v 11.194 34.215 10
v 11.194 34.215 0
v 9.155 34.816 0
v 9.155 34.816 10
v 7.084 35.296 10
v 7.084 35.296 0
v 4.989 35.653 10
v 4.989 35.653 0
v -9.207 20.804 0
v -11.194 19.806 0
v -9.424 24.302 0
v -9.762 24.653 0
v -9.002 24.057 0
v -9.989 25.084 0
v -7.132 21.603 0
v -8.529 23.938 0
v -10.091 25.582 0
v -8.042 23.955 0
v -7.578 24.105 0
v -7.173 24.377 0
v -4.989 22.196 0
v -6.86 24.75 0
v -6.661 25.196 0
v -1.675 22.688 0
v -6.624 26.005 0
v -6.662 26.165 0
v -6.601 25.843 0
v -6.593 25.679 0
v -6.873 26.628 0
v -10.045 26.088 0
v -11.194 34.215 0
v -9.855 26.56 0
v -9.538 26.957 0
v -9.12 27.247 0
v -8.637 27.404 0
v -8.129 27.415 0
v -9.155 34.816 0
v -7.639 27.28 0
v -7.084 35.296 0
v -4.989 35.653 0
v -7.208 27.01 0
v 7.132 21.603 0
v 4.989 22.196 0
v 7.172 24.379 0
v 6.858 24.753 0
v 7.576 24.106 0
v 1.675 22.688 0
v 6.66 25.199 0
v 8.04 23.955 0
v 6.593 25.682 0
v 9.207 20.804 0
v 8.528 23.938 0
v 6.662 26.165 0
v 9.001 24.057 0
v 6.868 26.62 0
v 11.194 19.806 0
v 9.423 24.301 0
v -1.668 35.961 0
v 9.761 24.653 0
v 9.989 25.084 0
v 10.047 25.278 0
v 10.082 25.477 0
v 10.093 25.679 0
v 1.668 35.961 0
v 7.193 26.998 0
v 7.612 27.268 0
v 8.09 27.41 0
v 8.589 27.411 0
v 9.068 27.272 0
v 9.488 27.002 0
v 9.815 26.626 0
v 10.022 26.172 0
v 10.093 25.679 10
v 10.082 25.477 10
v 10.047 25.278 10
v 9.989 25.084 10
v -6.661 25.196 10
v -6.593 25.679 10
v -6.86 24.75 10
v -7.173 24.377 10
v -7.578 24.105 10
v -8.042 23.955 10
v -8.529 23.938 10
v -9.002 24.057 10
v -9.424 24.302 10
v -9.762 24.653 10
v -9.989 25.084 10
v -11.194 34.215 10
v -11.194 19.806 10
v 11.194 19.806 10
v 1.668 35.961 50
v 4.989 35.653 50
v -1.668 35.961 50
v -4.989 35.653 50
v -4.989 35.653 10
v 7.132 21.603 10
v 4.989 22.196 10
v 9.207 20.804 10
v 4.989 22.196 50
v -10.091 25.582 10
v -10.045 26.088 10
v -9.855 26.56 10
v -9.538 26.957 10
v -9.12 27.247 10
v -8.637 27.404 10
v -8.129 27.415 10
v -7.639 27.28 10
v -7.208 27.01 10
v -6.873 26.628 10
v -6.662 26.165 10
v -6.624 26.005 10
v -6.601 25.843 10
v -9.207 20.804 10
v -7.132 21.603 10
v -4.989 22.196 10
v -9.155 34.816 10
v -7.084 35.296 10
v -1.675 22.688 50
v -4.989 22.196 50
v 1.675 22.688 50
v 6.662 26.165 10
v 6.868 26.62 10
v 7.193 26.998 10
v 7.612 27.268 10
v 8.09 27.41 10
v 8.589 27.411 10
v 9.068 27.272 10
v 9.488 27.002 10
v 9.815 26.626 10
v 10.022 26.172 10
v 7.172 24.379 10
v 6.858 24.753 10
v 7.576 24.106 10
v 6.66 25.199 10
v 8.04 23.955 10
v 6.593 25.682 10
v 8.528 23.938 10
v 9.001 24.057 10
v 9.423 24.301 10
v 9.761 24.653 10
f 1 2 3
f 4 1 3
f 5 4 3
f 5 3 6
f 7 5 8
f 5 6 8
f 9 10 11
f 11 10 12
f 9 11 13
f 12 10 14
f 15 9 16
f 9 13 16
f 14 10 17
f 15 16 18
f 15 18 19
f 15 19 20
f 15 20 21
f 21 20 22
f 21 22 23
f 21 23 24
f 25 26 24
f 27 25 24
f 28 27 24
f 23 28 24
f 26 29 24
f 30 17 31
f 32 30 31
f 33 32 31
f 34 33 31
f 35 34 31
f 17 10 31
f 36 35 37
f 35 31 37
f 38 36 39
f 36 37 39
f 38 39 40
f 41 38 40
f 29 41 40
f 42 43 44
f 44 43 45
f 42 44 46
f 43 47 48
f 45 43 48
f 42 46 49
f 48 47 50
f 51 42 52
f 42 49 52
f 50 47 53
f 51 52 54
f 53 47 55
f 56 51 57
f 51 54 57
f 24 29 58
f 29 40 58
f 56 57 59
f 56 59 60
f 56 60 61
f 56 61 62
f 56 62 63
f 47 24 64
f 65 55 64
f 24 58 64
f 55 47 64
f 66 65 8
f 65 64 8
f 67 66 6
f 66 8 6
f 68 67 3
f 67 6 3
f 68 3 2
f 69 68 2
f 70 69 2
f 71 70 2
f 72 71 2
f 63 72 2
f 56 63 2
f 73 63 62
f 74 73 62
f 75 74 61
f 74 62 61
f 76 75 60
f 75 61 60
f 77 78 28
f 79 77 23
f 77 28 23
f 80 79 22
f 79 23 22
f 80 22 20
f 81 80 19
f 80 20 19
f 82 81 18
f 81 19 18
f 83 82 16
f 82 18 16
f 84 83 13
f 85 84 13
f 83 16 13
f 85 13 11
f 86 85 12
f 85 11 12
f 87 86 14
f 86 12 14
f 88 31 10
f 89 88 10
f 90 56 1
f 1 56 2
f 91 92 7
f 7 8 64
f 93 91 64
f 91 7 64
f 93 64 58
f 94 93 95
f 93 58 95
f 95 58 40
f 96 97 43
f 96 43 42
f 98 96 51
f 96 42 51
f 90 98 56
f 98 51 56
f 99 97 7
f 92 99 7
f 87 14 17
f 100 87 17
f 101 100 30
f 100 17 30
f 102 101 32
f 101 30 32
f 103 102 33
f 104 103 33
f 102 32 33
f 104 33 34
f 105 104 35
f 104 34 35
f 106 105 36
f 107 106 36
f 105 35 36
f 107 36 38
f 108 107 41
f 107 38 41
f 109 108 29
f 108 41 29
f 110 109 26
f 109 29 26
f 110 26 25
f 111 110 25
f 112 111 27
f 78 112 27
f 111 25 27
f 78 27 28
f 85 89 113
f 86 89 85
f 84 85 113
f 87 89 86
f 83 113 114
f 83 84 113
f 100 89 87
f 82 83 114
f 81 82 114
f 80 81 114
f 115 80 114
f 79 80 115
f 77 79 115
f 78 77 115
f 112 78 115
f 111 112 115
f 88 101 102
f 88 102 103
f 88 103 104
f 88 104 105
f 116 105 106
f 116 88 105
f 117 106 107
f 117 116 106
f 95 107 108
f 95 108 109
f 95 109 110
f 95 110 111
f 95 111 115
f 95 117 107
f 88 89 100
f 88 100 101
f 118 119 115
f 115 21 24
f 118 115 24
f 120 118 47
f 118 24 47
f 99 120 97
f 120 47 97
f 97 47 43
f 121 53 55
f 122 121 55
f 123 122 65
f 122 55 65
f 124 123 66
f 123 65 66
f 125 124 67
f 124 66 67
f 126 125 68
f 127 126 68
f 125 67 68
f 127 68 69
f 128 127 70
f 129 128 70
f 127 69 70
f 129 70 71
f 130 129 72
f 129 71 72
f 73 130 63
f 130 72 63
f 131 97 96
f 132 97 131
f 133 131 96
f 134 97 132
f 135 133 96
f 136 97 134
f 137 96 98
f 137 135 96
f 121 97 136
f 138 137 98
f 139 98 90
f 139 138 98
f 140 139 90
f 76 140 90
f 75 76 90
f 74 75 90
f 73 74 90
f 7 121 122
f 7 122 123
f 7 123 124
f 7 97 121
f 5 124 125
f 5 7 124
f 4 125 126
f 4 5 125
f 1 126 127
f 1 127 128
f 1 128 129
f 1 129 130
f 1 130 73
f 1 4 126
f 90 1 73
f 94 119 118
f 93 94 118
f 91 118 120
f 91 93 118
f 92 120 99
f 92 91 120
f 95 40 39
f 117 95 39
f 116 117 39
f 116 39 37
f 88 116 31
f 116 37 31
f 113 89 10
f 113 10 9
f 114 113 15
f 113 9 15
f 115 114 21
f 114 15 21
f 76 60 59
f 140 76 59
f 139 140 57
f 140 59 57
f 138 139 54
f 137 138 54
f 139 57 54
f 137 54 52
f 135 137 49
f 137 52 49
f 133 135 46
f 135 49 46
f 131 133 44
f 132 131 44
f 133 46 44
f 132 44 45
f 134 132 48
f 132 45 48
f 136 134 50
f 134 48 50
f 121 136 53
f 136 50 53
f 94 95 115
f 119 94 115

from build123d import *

# Parameters (mm, degrees)
F1_DEPTH = 10
F2_DEPTH = 50


with BuildPart() as f1:
    # F0 (on Top) → F1 (new body)
    with BuildSketch(Plane.XY):
        with BuildLine():
            Line((-11.1938343047, 34.2154654149), (-11.1938343047, 24.5702680807))
            ThreePointArc((-11.1938343047, 24.5702680807), (-10.5947366889, 24.8344831735), (-9.9894082697, 25.0840930157))
            ThreePointArc((-9.9894082697, 25.0840930157), (-8.8842385883, 27.3428748435), (-6.6624588878, 26.1650843983))
            ThreePointArc((-6.6624588878, 26.1650843983), (-5.8286474975, 26.3633622353), (-4.988963041, 26.5350758012))
            Line((-4.988963041, 26.5350758012), (-4.988963041, 35.6526331114))
            ThreePointArc((-4.988963041, 35.6526331114), (-8.1232441321, 35.0715398118), (-11.1938343047, 34.2154654149))
        make_face()
        with BuildLine():
            ThreePointArc((-4.988963041, 26.5350758012), (0, 27), (4.988963041, 26.5350758012))
            Line((4.988963041, 26.5350758012), (4.988963041, 35.6526331114))
            ThreePointArc((4.988963041, 35.6526331114), (0, 36), (-4.988963041, 35.6526331114))
            Line((-4.988963041, 35.6526331114), (-4.988963041, 26.5350758012))
        make_face()
        with BuildLine():
            ThreePointArc((9.9894082697, 25.0840930157), (10.5947366889, 24.8344831735), (11.1938343047, 24.5702680807))
            Line((11.1938343047, 24.5702680807), (11.1938343047, 34.2154654149))
            ThreePointArc((11.1938343047, 34.2154654149), (8.1232441321, 35.0715398118), (4.988963041, 35.6526331114))
            Line((4.988963041, 35.6526331114), (4.988963041, 26.5350758012))
            ThreePointArc((4.988963041, 26.5350758012), (5.8286474975, 26.3633622353), (6.6624588878, 26.1650843983))
            ThreePointArc((6.6624588878, 26.1650843983), (8.5891721662, 27.4111900636), (10.0934588481, 25.67852594))
            ThreePointArc((10.0934588481, 25.67852594), (10.0672499445, 25.3767905326), (9.9894082697, 25.0840930157))
        make_face()
        with BuildLine():
            ThreePointArc((4.988963041, 22.1962327384), (8.1792145377, 21.2288235554), (11.1938343047, 19.8055692561))
            Line((11.1938343047, 19.8055692561), (11.1938343047, 24.5702680807))
            ThreePointArc((11.1938343047, 24.5702680807), (10.5947366889, 24.8344831735), (9.9894082697, 25.0840930157))
            ThreePointArc((9.9894082697, 25.0840930157), (7.802679108, 24.0141770365), (6.6624588878, 26.1650843983))
            ThreePointArc((6.6624588878, 26.1650843983), (5.8286474975, 26.3633622353), (4.988963041, 26.5350758012))
            Line((4.988963041, 26.5350758012), (4.988963041, 22.1962327384))
        make_face()
        with BuildLine():
            Line((-11.1938343047, 24.5702680807), (-11.1938343047, 19.8055692561))
            ThreePointArc((-11.1938343047, 19.8055692561), (-8.1792145377, 21.2288235554), (-4.988963041, 22.1962327384))
            Line((-4.988963041, 22.1962327384), (-4.988963041, 26.5350758012))
            ThreePointArc((-4.988963041, 26.5350758012), (-5.8286474975, 26.3633622353), (-6.6624588878, 26.1650843983))
            ThreePointArc((-6.6624588878, 26.1650843983), (-6.6107947245, 25.9242392581), (-6.5934588481, 25.67852594))
            ThreePointArc((-6.5934588481, 25.67852594), (-8.0417234407, 23.9547348436), (-9.9894082697, 25.0840930157))
            ThreePointArc((-9.9894082697, 25.0840930157), (-10.5947366889, 24.8344831735), (-11.1938343047, 24.5702680807))
        make_face()
        with BuildLine():
            ThreePointArc((-4.988963041, 22.1962327384), (0, 22.75), (4.988963041, 22.1962327384))
            Line((4.988963041, 22.1962327384), (4.988963041, 26.5350758012))
            ThreePointArc((4.988963041, 26.5350758012), (0, 27), (-4.988963041, 26.5350758012))
            Line((-4.988963041, 26.5350758012), (-4.988963041, 22.1962327384))
        make_face()
    extrude(amount=F1_DEPTH)

    # F0 (on Top) → F2 (join)
    with BuildSketch(Plane.XY):
        with BuildLine():
            ThreePointArc((-4.988963041, 26.5350758012), (0, 27), (4.988963041, 26.5350758012))
            Line((4.988963041, 26.5350758012), (4.988963041, 35.6526331114))
            ThreePointArc((4.988963041, 35.6526331114), (0, 36), (-4.988963041, 35.6526331114))
            Line((-4.988963041, 35.6526331114), (-4.988963041, 26.5350758012))
        make_face()
        with BuildLine():
            ThreePointArc((-4.988963041, 22.1962327384), (0, 22.75), (4.988963041, 22.1962327384))
            Line((4.988963041, 22.1962327384), (4.988963041, 26.5350758012))
            ThreePointArc((4.988963041, 26.5350758012), (0, 27), (-4.988963041, 26.5350758012))
            Line((-4.988963041, 26.5350758012), (-4.988963041, 22.1962327384))
        make_face()
    extrude(amount=F2_DEPTH)


solid = f1.part
